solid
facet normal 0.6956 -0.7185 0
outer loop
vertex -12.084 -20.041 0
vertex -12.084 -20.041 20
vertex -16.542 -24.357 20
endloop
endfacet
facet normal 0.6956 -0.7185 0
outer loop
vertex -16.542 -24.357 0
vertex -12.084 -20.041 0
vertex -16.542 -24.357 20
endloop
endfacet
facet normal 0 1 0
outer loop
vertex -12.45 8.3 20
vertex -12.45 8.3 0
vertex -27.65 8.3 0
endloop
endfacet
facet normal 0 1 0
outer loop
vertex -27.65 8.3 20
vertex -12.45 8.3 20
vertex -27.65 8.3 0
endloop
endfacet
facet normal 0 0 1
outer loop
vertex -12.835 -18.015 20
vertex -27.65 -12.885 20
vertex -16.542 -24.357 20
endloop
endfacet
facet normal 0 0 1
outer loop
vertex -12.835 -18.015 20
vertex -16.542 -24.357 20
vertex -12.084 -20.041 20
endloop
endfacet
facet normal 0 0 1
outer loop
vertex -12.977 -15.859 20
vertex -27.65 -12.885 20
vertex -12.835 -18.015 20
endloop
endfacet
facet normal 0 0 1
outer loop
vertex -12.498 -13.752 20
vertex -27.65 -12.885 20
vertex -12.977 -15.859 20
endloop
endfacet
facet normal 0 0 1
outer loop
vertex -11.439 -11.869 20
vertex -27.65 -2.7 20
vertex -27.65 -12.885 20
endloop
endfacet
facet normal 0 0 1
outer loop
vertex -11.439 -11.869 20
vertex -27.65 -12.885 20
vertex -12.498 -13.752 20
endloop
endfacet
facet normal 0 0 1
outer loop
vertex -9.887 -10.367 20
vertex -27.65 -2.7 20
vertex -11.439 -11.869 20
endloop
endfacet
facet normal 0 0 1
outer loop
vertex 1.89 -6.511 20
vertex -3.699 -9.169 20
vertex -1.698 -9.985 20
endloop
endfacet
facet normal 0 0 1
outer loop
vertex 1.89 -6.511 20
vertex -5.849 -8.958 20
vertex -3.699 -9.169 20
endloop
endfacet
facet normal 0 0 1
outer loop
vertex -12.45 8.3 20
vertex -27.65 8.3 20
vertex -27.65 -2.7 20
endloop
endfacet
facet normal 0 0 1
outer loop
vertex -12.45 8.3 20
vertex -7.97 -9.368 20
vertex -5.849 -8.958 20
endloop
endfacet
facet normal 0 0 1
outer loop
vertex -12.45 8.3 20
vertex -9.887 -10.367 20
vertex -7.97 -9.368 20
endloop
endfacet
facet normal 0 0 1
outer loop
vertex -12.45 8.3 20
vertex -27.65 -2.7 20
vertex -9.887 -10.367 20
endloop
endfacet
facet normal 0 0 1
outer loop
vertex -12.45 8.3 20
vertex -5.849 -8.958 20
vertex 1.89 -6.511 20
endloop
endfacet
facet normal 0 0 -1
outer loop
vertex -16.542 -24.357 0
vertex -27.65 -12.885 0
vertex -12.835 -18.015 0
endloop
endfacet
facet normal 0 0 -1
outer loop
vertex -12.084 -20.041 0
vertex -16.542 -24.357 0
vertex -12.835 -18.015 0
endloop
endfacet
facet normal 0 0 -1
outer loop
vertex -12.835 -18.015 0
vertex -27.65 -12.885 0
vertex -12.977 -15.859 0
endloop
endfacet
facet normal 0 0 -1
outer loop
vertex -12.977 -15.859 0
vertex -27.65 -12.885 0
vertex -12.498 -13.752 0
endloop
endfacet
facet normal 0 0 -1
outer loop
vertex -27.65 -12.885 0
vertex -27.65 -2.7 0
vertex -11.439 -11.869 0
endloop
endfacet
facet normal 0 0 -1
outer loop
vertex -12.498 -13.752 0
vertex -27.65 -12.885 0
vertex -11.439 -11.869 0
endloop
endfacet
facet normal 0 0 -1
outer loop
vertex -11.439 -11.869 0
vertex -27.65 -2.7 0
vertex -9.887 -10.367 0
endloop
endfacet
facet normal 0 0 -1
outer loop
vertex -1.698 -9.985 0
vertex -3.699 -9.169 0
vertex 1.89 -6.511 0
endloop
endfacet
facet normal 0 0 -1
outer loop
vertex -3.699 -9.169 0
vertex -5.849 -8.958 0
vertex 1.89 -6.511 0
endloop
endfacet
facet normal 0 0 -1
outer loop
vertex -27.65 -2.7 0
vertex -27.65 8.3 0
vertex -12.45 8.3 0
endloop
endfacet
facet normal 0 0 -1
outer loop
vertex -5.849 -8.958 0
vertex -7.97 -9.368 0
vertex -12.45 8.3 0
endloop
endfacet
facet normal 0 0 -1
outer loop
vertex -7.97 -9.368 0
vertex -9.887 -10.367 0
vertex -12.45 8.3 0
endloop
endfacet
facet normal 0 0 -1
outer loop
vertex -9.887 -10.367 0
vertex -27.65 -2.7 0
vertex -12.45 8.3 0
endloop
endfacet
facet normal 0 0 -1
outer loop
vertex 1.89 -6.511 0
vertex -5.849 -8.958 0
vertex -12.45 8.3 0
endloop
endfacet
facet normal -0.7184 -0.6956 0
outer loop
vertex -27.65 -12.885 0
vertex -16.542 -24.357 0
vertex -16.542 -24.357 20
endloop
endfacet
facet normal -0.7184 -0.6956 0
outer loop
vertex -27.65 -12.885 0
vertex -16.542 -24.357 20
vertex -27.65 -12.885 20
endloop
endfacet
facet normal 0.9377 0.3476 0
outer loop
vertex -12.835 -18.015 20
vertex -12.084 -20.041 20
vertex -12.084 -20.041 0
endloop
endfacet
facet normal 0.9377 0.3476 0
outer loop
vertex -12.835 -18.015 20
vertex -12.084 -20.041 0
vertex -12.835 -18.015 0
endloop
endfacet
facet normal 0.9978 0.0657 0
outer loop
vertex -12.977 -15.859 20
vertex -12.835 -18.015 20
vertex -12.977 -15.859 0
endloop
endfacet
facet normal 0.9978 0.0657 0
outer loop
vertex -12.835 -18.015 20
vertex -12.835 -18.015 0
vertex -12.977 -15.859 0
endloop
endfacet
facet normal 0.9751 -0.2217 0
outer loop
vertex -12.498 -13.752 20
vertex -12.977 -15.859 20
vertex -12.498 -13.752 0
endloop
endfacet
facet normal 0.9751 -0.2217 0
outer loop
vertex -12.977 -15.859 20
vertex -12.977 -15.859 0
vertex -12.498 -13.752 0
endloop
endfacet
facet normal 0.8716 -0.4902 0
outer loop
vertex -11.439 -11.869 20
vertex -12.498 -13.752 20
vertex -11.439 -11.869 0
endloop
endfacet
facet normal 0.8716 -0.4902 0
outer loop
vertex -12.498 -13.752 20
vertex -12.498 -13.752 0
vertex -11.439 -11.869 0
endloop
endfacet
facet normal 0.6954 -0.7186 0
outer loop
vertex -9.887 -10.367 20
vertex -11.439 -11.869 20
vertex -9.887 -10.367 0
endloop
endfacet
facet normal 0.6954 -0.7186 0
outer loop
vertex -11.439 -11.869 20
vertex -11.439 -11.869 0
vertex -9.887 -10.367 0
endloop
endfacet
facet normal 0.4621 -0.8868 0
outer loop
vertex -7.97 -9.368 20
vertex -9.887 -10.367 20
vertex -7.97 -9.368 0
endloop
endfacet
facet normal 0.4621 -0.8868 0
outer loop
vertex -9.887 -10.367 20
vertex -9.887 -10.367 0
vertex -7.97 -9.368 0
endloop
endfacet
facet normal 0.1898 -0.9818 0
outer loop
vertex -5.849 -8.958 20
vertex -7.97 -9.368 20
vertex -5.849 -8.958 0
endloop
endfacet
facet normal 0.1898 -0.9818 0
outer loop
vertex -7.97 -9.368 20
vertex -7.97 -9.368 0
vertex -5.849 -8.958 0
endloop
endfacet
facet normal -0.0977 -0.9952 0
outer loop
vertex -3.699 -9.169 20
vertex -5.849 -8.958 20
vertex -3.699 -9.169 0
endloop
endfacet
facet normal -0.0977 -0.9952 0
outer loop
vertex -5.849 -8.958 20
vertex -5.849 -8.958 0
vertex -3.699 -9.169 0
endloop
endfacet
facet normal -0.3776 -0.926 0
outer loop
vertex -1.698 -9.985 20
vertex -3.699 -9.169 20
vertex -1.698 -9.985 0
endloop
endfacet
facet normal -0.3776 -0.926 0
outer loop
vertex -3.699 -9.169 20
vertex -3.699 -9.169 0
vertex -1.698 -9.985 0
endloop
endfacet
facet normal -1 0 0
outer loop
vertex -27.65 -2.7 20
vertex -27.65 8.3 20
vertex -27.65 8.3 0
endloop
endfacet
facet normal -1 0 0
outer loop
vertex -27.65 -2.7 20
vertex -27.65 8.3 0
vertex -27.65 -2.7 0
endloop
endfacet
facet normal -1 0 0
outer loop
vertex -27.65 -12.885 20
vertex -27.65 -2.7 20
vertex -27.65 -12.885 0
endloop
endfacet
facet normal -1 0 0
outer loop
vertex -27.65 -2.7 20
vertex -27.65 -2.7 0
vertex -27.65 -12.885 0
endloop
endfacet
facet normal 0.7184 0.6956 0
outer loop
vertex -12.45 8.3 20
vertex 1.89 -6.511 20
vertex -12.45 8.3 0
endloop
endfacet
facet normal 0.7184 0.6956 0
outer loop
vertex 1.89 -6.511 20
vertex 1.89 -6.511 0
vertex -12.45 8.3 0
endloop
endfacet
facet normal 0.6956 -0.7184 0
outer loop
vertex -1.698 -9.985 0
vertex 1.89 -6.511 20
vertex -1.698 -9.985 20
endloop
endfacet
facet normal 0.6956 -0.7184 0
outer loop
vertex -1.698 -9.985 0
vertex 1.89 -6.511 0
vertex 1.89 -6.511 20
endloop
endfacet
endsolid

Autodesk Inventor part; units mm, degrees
ref_plane "YZ Plane" through (0, 0, 0) normal (1, 0, 0) x (0, 1, 0)
ref_plane "XZ Plane" through (0, 0, 0) normal (0, 1, 0) x (-1, 0, 0)
ref_plane "XY Plane" through (0, 0, 0) normal (0, 0, 1) x (1, 0, 0)
sketch "Sketch1" plane through (0, 0, 0) normal (0, 0, 1) x (1, 0, 0)
  circle A0 centre (-22.95, -2.7) radius 1.7 projected
  circle A1 centre (-6.95, -2.7) radius 1.7 projected
  circle A2 centre (-22.95, -2.7) radius 4.7
  circle A3 centre (-6.95, -2.7) radius 3.7
  line L0 (3.4322, -7.8015) -> (-0.1118, -11.233) projected
  line L1 (6.9476, -1.614) -> (-26.719, -34.211)
  line L2 (-14.4322, -25.0985) -> (-13.041, -26.5353) projected
  line L3 (-12.4947, -28.5372) -> (-38.4967, -1.682)
  line L4 (-27.65, -2.7) -> (-27.65, -12.8846)
  arc A4 (-10.8882, -21.667) -> (-0.1118, -11.233) centre (-5.5, -16.45) ccw projected
  line L5 (-5.5, -16.45) -> (-6.8912, -15.0131)
  line L6 (-27.65, -2.7) -> (-22.95, -2.7)
  line L7 (-2.8497, 4.7907) -> (-5.9286, 4.7907) construction
  line L8 (1, 3.7907) -> (-32.1675, 3.7907)
  line L9 (1.89, -6.5109) -> (-12.4504, 8.3)
  line L10 (-12.4504, 8.3) -> (-43.44, 8.3)
  line L11 (-27.65, 8.3) -> (-27.65, -2.7)
  circle A5 centre (-5.5, -16.45) radius 7.5
  point P0 (0, 0)
  point P1 (-22.95, 2)
  point P2 (-6.95, 1)
  point P3 (-3.8133, -0.7376)
  point P4 (2.6084, -5.8153)
  point P5 (-13.7366, -25.8169)
  point P6 (-16.5419, -24.3572)
  point P7 (-4.3892, 4.7907)
  point P8 (-6.8365, 3.7907)
  point P9 (-27.65, 3.7907)
  point P10 (-4.2918, -0.1263)
  point P11 (-12.0843, -20.0413)
  point P12 (-1.6981, -9.985)
  dimension "d0" = 3
  dimension "d1" = 2
  dimension "d2" = 2
  dimension "d3" = 1
  dimension "d9" = 1
  dimension "d10" = 11
extrude "Extrusion1" add sketch "Sketch1" along normal blind 20 contours A0 | A2 | A3 | L11 L8 L9 L1 A5 L3 L4 | L11 L10 L9 L8 | A1
properties part number "back cpap holder and pg"
